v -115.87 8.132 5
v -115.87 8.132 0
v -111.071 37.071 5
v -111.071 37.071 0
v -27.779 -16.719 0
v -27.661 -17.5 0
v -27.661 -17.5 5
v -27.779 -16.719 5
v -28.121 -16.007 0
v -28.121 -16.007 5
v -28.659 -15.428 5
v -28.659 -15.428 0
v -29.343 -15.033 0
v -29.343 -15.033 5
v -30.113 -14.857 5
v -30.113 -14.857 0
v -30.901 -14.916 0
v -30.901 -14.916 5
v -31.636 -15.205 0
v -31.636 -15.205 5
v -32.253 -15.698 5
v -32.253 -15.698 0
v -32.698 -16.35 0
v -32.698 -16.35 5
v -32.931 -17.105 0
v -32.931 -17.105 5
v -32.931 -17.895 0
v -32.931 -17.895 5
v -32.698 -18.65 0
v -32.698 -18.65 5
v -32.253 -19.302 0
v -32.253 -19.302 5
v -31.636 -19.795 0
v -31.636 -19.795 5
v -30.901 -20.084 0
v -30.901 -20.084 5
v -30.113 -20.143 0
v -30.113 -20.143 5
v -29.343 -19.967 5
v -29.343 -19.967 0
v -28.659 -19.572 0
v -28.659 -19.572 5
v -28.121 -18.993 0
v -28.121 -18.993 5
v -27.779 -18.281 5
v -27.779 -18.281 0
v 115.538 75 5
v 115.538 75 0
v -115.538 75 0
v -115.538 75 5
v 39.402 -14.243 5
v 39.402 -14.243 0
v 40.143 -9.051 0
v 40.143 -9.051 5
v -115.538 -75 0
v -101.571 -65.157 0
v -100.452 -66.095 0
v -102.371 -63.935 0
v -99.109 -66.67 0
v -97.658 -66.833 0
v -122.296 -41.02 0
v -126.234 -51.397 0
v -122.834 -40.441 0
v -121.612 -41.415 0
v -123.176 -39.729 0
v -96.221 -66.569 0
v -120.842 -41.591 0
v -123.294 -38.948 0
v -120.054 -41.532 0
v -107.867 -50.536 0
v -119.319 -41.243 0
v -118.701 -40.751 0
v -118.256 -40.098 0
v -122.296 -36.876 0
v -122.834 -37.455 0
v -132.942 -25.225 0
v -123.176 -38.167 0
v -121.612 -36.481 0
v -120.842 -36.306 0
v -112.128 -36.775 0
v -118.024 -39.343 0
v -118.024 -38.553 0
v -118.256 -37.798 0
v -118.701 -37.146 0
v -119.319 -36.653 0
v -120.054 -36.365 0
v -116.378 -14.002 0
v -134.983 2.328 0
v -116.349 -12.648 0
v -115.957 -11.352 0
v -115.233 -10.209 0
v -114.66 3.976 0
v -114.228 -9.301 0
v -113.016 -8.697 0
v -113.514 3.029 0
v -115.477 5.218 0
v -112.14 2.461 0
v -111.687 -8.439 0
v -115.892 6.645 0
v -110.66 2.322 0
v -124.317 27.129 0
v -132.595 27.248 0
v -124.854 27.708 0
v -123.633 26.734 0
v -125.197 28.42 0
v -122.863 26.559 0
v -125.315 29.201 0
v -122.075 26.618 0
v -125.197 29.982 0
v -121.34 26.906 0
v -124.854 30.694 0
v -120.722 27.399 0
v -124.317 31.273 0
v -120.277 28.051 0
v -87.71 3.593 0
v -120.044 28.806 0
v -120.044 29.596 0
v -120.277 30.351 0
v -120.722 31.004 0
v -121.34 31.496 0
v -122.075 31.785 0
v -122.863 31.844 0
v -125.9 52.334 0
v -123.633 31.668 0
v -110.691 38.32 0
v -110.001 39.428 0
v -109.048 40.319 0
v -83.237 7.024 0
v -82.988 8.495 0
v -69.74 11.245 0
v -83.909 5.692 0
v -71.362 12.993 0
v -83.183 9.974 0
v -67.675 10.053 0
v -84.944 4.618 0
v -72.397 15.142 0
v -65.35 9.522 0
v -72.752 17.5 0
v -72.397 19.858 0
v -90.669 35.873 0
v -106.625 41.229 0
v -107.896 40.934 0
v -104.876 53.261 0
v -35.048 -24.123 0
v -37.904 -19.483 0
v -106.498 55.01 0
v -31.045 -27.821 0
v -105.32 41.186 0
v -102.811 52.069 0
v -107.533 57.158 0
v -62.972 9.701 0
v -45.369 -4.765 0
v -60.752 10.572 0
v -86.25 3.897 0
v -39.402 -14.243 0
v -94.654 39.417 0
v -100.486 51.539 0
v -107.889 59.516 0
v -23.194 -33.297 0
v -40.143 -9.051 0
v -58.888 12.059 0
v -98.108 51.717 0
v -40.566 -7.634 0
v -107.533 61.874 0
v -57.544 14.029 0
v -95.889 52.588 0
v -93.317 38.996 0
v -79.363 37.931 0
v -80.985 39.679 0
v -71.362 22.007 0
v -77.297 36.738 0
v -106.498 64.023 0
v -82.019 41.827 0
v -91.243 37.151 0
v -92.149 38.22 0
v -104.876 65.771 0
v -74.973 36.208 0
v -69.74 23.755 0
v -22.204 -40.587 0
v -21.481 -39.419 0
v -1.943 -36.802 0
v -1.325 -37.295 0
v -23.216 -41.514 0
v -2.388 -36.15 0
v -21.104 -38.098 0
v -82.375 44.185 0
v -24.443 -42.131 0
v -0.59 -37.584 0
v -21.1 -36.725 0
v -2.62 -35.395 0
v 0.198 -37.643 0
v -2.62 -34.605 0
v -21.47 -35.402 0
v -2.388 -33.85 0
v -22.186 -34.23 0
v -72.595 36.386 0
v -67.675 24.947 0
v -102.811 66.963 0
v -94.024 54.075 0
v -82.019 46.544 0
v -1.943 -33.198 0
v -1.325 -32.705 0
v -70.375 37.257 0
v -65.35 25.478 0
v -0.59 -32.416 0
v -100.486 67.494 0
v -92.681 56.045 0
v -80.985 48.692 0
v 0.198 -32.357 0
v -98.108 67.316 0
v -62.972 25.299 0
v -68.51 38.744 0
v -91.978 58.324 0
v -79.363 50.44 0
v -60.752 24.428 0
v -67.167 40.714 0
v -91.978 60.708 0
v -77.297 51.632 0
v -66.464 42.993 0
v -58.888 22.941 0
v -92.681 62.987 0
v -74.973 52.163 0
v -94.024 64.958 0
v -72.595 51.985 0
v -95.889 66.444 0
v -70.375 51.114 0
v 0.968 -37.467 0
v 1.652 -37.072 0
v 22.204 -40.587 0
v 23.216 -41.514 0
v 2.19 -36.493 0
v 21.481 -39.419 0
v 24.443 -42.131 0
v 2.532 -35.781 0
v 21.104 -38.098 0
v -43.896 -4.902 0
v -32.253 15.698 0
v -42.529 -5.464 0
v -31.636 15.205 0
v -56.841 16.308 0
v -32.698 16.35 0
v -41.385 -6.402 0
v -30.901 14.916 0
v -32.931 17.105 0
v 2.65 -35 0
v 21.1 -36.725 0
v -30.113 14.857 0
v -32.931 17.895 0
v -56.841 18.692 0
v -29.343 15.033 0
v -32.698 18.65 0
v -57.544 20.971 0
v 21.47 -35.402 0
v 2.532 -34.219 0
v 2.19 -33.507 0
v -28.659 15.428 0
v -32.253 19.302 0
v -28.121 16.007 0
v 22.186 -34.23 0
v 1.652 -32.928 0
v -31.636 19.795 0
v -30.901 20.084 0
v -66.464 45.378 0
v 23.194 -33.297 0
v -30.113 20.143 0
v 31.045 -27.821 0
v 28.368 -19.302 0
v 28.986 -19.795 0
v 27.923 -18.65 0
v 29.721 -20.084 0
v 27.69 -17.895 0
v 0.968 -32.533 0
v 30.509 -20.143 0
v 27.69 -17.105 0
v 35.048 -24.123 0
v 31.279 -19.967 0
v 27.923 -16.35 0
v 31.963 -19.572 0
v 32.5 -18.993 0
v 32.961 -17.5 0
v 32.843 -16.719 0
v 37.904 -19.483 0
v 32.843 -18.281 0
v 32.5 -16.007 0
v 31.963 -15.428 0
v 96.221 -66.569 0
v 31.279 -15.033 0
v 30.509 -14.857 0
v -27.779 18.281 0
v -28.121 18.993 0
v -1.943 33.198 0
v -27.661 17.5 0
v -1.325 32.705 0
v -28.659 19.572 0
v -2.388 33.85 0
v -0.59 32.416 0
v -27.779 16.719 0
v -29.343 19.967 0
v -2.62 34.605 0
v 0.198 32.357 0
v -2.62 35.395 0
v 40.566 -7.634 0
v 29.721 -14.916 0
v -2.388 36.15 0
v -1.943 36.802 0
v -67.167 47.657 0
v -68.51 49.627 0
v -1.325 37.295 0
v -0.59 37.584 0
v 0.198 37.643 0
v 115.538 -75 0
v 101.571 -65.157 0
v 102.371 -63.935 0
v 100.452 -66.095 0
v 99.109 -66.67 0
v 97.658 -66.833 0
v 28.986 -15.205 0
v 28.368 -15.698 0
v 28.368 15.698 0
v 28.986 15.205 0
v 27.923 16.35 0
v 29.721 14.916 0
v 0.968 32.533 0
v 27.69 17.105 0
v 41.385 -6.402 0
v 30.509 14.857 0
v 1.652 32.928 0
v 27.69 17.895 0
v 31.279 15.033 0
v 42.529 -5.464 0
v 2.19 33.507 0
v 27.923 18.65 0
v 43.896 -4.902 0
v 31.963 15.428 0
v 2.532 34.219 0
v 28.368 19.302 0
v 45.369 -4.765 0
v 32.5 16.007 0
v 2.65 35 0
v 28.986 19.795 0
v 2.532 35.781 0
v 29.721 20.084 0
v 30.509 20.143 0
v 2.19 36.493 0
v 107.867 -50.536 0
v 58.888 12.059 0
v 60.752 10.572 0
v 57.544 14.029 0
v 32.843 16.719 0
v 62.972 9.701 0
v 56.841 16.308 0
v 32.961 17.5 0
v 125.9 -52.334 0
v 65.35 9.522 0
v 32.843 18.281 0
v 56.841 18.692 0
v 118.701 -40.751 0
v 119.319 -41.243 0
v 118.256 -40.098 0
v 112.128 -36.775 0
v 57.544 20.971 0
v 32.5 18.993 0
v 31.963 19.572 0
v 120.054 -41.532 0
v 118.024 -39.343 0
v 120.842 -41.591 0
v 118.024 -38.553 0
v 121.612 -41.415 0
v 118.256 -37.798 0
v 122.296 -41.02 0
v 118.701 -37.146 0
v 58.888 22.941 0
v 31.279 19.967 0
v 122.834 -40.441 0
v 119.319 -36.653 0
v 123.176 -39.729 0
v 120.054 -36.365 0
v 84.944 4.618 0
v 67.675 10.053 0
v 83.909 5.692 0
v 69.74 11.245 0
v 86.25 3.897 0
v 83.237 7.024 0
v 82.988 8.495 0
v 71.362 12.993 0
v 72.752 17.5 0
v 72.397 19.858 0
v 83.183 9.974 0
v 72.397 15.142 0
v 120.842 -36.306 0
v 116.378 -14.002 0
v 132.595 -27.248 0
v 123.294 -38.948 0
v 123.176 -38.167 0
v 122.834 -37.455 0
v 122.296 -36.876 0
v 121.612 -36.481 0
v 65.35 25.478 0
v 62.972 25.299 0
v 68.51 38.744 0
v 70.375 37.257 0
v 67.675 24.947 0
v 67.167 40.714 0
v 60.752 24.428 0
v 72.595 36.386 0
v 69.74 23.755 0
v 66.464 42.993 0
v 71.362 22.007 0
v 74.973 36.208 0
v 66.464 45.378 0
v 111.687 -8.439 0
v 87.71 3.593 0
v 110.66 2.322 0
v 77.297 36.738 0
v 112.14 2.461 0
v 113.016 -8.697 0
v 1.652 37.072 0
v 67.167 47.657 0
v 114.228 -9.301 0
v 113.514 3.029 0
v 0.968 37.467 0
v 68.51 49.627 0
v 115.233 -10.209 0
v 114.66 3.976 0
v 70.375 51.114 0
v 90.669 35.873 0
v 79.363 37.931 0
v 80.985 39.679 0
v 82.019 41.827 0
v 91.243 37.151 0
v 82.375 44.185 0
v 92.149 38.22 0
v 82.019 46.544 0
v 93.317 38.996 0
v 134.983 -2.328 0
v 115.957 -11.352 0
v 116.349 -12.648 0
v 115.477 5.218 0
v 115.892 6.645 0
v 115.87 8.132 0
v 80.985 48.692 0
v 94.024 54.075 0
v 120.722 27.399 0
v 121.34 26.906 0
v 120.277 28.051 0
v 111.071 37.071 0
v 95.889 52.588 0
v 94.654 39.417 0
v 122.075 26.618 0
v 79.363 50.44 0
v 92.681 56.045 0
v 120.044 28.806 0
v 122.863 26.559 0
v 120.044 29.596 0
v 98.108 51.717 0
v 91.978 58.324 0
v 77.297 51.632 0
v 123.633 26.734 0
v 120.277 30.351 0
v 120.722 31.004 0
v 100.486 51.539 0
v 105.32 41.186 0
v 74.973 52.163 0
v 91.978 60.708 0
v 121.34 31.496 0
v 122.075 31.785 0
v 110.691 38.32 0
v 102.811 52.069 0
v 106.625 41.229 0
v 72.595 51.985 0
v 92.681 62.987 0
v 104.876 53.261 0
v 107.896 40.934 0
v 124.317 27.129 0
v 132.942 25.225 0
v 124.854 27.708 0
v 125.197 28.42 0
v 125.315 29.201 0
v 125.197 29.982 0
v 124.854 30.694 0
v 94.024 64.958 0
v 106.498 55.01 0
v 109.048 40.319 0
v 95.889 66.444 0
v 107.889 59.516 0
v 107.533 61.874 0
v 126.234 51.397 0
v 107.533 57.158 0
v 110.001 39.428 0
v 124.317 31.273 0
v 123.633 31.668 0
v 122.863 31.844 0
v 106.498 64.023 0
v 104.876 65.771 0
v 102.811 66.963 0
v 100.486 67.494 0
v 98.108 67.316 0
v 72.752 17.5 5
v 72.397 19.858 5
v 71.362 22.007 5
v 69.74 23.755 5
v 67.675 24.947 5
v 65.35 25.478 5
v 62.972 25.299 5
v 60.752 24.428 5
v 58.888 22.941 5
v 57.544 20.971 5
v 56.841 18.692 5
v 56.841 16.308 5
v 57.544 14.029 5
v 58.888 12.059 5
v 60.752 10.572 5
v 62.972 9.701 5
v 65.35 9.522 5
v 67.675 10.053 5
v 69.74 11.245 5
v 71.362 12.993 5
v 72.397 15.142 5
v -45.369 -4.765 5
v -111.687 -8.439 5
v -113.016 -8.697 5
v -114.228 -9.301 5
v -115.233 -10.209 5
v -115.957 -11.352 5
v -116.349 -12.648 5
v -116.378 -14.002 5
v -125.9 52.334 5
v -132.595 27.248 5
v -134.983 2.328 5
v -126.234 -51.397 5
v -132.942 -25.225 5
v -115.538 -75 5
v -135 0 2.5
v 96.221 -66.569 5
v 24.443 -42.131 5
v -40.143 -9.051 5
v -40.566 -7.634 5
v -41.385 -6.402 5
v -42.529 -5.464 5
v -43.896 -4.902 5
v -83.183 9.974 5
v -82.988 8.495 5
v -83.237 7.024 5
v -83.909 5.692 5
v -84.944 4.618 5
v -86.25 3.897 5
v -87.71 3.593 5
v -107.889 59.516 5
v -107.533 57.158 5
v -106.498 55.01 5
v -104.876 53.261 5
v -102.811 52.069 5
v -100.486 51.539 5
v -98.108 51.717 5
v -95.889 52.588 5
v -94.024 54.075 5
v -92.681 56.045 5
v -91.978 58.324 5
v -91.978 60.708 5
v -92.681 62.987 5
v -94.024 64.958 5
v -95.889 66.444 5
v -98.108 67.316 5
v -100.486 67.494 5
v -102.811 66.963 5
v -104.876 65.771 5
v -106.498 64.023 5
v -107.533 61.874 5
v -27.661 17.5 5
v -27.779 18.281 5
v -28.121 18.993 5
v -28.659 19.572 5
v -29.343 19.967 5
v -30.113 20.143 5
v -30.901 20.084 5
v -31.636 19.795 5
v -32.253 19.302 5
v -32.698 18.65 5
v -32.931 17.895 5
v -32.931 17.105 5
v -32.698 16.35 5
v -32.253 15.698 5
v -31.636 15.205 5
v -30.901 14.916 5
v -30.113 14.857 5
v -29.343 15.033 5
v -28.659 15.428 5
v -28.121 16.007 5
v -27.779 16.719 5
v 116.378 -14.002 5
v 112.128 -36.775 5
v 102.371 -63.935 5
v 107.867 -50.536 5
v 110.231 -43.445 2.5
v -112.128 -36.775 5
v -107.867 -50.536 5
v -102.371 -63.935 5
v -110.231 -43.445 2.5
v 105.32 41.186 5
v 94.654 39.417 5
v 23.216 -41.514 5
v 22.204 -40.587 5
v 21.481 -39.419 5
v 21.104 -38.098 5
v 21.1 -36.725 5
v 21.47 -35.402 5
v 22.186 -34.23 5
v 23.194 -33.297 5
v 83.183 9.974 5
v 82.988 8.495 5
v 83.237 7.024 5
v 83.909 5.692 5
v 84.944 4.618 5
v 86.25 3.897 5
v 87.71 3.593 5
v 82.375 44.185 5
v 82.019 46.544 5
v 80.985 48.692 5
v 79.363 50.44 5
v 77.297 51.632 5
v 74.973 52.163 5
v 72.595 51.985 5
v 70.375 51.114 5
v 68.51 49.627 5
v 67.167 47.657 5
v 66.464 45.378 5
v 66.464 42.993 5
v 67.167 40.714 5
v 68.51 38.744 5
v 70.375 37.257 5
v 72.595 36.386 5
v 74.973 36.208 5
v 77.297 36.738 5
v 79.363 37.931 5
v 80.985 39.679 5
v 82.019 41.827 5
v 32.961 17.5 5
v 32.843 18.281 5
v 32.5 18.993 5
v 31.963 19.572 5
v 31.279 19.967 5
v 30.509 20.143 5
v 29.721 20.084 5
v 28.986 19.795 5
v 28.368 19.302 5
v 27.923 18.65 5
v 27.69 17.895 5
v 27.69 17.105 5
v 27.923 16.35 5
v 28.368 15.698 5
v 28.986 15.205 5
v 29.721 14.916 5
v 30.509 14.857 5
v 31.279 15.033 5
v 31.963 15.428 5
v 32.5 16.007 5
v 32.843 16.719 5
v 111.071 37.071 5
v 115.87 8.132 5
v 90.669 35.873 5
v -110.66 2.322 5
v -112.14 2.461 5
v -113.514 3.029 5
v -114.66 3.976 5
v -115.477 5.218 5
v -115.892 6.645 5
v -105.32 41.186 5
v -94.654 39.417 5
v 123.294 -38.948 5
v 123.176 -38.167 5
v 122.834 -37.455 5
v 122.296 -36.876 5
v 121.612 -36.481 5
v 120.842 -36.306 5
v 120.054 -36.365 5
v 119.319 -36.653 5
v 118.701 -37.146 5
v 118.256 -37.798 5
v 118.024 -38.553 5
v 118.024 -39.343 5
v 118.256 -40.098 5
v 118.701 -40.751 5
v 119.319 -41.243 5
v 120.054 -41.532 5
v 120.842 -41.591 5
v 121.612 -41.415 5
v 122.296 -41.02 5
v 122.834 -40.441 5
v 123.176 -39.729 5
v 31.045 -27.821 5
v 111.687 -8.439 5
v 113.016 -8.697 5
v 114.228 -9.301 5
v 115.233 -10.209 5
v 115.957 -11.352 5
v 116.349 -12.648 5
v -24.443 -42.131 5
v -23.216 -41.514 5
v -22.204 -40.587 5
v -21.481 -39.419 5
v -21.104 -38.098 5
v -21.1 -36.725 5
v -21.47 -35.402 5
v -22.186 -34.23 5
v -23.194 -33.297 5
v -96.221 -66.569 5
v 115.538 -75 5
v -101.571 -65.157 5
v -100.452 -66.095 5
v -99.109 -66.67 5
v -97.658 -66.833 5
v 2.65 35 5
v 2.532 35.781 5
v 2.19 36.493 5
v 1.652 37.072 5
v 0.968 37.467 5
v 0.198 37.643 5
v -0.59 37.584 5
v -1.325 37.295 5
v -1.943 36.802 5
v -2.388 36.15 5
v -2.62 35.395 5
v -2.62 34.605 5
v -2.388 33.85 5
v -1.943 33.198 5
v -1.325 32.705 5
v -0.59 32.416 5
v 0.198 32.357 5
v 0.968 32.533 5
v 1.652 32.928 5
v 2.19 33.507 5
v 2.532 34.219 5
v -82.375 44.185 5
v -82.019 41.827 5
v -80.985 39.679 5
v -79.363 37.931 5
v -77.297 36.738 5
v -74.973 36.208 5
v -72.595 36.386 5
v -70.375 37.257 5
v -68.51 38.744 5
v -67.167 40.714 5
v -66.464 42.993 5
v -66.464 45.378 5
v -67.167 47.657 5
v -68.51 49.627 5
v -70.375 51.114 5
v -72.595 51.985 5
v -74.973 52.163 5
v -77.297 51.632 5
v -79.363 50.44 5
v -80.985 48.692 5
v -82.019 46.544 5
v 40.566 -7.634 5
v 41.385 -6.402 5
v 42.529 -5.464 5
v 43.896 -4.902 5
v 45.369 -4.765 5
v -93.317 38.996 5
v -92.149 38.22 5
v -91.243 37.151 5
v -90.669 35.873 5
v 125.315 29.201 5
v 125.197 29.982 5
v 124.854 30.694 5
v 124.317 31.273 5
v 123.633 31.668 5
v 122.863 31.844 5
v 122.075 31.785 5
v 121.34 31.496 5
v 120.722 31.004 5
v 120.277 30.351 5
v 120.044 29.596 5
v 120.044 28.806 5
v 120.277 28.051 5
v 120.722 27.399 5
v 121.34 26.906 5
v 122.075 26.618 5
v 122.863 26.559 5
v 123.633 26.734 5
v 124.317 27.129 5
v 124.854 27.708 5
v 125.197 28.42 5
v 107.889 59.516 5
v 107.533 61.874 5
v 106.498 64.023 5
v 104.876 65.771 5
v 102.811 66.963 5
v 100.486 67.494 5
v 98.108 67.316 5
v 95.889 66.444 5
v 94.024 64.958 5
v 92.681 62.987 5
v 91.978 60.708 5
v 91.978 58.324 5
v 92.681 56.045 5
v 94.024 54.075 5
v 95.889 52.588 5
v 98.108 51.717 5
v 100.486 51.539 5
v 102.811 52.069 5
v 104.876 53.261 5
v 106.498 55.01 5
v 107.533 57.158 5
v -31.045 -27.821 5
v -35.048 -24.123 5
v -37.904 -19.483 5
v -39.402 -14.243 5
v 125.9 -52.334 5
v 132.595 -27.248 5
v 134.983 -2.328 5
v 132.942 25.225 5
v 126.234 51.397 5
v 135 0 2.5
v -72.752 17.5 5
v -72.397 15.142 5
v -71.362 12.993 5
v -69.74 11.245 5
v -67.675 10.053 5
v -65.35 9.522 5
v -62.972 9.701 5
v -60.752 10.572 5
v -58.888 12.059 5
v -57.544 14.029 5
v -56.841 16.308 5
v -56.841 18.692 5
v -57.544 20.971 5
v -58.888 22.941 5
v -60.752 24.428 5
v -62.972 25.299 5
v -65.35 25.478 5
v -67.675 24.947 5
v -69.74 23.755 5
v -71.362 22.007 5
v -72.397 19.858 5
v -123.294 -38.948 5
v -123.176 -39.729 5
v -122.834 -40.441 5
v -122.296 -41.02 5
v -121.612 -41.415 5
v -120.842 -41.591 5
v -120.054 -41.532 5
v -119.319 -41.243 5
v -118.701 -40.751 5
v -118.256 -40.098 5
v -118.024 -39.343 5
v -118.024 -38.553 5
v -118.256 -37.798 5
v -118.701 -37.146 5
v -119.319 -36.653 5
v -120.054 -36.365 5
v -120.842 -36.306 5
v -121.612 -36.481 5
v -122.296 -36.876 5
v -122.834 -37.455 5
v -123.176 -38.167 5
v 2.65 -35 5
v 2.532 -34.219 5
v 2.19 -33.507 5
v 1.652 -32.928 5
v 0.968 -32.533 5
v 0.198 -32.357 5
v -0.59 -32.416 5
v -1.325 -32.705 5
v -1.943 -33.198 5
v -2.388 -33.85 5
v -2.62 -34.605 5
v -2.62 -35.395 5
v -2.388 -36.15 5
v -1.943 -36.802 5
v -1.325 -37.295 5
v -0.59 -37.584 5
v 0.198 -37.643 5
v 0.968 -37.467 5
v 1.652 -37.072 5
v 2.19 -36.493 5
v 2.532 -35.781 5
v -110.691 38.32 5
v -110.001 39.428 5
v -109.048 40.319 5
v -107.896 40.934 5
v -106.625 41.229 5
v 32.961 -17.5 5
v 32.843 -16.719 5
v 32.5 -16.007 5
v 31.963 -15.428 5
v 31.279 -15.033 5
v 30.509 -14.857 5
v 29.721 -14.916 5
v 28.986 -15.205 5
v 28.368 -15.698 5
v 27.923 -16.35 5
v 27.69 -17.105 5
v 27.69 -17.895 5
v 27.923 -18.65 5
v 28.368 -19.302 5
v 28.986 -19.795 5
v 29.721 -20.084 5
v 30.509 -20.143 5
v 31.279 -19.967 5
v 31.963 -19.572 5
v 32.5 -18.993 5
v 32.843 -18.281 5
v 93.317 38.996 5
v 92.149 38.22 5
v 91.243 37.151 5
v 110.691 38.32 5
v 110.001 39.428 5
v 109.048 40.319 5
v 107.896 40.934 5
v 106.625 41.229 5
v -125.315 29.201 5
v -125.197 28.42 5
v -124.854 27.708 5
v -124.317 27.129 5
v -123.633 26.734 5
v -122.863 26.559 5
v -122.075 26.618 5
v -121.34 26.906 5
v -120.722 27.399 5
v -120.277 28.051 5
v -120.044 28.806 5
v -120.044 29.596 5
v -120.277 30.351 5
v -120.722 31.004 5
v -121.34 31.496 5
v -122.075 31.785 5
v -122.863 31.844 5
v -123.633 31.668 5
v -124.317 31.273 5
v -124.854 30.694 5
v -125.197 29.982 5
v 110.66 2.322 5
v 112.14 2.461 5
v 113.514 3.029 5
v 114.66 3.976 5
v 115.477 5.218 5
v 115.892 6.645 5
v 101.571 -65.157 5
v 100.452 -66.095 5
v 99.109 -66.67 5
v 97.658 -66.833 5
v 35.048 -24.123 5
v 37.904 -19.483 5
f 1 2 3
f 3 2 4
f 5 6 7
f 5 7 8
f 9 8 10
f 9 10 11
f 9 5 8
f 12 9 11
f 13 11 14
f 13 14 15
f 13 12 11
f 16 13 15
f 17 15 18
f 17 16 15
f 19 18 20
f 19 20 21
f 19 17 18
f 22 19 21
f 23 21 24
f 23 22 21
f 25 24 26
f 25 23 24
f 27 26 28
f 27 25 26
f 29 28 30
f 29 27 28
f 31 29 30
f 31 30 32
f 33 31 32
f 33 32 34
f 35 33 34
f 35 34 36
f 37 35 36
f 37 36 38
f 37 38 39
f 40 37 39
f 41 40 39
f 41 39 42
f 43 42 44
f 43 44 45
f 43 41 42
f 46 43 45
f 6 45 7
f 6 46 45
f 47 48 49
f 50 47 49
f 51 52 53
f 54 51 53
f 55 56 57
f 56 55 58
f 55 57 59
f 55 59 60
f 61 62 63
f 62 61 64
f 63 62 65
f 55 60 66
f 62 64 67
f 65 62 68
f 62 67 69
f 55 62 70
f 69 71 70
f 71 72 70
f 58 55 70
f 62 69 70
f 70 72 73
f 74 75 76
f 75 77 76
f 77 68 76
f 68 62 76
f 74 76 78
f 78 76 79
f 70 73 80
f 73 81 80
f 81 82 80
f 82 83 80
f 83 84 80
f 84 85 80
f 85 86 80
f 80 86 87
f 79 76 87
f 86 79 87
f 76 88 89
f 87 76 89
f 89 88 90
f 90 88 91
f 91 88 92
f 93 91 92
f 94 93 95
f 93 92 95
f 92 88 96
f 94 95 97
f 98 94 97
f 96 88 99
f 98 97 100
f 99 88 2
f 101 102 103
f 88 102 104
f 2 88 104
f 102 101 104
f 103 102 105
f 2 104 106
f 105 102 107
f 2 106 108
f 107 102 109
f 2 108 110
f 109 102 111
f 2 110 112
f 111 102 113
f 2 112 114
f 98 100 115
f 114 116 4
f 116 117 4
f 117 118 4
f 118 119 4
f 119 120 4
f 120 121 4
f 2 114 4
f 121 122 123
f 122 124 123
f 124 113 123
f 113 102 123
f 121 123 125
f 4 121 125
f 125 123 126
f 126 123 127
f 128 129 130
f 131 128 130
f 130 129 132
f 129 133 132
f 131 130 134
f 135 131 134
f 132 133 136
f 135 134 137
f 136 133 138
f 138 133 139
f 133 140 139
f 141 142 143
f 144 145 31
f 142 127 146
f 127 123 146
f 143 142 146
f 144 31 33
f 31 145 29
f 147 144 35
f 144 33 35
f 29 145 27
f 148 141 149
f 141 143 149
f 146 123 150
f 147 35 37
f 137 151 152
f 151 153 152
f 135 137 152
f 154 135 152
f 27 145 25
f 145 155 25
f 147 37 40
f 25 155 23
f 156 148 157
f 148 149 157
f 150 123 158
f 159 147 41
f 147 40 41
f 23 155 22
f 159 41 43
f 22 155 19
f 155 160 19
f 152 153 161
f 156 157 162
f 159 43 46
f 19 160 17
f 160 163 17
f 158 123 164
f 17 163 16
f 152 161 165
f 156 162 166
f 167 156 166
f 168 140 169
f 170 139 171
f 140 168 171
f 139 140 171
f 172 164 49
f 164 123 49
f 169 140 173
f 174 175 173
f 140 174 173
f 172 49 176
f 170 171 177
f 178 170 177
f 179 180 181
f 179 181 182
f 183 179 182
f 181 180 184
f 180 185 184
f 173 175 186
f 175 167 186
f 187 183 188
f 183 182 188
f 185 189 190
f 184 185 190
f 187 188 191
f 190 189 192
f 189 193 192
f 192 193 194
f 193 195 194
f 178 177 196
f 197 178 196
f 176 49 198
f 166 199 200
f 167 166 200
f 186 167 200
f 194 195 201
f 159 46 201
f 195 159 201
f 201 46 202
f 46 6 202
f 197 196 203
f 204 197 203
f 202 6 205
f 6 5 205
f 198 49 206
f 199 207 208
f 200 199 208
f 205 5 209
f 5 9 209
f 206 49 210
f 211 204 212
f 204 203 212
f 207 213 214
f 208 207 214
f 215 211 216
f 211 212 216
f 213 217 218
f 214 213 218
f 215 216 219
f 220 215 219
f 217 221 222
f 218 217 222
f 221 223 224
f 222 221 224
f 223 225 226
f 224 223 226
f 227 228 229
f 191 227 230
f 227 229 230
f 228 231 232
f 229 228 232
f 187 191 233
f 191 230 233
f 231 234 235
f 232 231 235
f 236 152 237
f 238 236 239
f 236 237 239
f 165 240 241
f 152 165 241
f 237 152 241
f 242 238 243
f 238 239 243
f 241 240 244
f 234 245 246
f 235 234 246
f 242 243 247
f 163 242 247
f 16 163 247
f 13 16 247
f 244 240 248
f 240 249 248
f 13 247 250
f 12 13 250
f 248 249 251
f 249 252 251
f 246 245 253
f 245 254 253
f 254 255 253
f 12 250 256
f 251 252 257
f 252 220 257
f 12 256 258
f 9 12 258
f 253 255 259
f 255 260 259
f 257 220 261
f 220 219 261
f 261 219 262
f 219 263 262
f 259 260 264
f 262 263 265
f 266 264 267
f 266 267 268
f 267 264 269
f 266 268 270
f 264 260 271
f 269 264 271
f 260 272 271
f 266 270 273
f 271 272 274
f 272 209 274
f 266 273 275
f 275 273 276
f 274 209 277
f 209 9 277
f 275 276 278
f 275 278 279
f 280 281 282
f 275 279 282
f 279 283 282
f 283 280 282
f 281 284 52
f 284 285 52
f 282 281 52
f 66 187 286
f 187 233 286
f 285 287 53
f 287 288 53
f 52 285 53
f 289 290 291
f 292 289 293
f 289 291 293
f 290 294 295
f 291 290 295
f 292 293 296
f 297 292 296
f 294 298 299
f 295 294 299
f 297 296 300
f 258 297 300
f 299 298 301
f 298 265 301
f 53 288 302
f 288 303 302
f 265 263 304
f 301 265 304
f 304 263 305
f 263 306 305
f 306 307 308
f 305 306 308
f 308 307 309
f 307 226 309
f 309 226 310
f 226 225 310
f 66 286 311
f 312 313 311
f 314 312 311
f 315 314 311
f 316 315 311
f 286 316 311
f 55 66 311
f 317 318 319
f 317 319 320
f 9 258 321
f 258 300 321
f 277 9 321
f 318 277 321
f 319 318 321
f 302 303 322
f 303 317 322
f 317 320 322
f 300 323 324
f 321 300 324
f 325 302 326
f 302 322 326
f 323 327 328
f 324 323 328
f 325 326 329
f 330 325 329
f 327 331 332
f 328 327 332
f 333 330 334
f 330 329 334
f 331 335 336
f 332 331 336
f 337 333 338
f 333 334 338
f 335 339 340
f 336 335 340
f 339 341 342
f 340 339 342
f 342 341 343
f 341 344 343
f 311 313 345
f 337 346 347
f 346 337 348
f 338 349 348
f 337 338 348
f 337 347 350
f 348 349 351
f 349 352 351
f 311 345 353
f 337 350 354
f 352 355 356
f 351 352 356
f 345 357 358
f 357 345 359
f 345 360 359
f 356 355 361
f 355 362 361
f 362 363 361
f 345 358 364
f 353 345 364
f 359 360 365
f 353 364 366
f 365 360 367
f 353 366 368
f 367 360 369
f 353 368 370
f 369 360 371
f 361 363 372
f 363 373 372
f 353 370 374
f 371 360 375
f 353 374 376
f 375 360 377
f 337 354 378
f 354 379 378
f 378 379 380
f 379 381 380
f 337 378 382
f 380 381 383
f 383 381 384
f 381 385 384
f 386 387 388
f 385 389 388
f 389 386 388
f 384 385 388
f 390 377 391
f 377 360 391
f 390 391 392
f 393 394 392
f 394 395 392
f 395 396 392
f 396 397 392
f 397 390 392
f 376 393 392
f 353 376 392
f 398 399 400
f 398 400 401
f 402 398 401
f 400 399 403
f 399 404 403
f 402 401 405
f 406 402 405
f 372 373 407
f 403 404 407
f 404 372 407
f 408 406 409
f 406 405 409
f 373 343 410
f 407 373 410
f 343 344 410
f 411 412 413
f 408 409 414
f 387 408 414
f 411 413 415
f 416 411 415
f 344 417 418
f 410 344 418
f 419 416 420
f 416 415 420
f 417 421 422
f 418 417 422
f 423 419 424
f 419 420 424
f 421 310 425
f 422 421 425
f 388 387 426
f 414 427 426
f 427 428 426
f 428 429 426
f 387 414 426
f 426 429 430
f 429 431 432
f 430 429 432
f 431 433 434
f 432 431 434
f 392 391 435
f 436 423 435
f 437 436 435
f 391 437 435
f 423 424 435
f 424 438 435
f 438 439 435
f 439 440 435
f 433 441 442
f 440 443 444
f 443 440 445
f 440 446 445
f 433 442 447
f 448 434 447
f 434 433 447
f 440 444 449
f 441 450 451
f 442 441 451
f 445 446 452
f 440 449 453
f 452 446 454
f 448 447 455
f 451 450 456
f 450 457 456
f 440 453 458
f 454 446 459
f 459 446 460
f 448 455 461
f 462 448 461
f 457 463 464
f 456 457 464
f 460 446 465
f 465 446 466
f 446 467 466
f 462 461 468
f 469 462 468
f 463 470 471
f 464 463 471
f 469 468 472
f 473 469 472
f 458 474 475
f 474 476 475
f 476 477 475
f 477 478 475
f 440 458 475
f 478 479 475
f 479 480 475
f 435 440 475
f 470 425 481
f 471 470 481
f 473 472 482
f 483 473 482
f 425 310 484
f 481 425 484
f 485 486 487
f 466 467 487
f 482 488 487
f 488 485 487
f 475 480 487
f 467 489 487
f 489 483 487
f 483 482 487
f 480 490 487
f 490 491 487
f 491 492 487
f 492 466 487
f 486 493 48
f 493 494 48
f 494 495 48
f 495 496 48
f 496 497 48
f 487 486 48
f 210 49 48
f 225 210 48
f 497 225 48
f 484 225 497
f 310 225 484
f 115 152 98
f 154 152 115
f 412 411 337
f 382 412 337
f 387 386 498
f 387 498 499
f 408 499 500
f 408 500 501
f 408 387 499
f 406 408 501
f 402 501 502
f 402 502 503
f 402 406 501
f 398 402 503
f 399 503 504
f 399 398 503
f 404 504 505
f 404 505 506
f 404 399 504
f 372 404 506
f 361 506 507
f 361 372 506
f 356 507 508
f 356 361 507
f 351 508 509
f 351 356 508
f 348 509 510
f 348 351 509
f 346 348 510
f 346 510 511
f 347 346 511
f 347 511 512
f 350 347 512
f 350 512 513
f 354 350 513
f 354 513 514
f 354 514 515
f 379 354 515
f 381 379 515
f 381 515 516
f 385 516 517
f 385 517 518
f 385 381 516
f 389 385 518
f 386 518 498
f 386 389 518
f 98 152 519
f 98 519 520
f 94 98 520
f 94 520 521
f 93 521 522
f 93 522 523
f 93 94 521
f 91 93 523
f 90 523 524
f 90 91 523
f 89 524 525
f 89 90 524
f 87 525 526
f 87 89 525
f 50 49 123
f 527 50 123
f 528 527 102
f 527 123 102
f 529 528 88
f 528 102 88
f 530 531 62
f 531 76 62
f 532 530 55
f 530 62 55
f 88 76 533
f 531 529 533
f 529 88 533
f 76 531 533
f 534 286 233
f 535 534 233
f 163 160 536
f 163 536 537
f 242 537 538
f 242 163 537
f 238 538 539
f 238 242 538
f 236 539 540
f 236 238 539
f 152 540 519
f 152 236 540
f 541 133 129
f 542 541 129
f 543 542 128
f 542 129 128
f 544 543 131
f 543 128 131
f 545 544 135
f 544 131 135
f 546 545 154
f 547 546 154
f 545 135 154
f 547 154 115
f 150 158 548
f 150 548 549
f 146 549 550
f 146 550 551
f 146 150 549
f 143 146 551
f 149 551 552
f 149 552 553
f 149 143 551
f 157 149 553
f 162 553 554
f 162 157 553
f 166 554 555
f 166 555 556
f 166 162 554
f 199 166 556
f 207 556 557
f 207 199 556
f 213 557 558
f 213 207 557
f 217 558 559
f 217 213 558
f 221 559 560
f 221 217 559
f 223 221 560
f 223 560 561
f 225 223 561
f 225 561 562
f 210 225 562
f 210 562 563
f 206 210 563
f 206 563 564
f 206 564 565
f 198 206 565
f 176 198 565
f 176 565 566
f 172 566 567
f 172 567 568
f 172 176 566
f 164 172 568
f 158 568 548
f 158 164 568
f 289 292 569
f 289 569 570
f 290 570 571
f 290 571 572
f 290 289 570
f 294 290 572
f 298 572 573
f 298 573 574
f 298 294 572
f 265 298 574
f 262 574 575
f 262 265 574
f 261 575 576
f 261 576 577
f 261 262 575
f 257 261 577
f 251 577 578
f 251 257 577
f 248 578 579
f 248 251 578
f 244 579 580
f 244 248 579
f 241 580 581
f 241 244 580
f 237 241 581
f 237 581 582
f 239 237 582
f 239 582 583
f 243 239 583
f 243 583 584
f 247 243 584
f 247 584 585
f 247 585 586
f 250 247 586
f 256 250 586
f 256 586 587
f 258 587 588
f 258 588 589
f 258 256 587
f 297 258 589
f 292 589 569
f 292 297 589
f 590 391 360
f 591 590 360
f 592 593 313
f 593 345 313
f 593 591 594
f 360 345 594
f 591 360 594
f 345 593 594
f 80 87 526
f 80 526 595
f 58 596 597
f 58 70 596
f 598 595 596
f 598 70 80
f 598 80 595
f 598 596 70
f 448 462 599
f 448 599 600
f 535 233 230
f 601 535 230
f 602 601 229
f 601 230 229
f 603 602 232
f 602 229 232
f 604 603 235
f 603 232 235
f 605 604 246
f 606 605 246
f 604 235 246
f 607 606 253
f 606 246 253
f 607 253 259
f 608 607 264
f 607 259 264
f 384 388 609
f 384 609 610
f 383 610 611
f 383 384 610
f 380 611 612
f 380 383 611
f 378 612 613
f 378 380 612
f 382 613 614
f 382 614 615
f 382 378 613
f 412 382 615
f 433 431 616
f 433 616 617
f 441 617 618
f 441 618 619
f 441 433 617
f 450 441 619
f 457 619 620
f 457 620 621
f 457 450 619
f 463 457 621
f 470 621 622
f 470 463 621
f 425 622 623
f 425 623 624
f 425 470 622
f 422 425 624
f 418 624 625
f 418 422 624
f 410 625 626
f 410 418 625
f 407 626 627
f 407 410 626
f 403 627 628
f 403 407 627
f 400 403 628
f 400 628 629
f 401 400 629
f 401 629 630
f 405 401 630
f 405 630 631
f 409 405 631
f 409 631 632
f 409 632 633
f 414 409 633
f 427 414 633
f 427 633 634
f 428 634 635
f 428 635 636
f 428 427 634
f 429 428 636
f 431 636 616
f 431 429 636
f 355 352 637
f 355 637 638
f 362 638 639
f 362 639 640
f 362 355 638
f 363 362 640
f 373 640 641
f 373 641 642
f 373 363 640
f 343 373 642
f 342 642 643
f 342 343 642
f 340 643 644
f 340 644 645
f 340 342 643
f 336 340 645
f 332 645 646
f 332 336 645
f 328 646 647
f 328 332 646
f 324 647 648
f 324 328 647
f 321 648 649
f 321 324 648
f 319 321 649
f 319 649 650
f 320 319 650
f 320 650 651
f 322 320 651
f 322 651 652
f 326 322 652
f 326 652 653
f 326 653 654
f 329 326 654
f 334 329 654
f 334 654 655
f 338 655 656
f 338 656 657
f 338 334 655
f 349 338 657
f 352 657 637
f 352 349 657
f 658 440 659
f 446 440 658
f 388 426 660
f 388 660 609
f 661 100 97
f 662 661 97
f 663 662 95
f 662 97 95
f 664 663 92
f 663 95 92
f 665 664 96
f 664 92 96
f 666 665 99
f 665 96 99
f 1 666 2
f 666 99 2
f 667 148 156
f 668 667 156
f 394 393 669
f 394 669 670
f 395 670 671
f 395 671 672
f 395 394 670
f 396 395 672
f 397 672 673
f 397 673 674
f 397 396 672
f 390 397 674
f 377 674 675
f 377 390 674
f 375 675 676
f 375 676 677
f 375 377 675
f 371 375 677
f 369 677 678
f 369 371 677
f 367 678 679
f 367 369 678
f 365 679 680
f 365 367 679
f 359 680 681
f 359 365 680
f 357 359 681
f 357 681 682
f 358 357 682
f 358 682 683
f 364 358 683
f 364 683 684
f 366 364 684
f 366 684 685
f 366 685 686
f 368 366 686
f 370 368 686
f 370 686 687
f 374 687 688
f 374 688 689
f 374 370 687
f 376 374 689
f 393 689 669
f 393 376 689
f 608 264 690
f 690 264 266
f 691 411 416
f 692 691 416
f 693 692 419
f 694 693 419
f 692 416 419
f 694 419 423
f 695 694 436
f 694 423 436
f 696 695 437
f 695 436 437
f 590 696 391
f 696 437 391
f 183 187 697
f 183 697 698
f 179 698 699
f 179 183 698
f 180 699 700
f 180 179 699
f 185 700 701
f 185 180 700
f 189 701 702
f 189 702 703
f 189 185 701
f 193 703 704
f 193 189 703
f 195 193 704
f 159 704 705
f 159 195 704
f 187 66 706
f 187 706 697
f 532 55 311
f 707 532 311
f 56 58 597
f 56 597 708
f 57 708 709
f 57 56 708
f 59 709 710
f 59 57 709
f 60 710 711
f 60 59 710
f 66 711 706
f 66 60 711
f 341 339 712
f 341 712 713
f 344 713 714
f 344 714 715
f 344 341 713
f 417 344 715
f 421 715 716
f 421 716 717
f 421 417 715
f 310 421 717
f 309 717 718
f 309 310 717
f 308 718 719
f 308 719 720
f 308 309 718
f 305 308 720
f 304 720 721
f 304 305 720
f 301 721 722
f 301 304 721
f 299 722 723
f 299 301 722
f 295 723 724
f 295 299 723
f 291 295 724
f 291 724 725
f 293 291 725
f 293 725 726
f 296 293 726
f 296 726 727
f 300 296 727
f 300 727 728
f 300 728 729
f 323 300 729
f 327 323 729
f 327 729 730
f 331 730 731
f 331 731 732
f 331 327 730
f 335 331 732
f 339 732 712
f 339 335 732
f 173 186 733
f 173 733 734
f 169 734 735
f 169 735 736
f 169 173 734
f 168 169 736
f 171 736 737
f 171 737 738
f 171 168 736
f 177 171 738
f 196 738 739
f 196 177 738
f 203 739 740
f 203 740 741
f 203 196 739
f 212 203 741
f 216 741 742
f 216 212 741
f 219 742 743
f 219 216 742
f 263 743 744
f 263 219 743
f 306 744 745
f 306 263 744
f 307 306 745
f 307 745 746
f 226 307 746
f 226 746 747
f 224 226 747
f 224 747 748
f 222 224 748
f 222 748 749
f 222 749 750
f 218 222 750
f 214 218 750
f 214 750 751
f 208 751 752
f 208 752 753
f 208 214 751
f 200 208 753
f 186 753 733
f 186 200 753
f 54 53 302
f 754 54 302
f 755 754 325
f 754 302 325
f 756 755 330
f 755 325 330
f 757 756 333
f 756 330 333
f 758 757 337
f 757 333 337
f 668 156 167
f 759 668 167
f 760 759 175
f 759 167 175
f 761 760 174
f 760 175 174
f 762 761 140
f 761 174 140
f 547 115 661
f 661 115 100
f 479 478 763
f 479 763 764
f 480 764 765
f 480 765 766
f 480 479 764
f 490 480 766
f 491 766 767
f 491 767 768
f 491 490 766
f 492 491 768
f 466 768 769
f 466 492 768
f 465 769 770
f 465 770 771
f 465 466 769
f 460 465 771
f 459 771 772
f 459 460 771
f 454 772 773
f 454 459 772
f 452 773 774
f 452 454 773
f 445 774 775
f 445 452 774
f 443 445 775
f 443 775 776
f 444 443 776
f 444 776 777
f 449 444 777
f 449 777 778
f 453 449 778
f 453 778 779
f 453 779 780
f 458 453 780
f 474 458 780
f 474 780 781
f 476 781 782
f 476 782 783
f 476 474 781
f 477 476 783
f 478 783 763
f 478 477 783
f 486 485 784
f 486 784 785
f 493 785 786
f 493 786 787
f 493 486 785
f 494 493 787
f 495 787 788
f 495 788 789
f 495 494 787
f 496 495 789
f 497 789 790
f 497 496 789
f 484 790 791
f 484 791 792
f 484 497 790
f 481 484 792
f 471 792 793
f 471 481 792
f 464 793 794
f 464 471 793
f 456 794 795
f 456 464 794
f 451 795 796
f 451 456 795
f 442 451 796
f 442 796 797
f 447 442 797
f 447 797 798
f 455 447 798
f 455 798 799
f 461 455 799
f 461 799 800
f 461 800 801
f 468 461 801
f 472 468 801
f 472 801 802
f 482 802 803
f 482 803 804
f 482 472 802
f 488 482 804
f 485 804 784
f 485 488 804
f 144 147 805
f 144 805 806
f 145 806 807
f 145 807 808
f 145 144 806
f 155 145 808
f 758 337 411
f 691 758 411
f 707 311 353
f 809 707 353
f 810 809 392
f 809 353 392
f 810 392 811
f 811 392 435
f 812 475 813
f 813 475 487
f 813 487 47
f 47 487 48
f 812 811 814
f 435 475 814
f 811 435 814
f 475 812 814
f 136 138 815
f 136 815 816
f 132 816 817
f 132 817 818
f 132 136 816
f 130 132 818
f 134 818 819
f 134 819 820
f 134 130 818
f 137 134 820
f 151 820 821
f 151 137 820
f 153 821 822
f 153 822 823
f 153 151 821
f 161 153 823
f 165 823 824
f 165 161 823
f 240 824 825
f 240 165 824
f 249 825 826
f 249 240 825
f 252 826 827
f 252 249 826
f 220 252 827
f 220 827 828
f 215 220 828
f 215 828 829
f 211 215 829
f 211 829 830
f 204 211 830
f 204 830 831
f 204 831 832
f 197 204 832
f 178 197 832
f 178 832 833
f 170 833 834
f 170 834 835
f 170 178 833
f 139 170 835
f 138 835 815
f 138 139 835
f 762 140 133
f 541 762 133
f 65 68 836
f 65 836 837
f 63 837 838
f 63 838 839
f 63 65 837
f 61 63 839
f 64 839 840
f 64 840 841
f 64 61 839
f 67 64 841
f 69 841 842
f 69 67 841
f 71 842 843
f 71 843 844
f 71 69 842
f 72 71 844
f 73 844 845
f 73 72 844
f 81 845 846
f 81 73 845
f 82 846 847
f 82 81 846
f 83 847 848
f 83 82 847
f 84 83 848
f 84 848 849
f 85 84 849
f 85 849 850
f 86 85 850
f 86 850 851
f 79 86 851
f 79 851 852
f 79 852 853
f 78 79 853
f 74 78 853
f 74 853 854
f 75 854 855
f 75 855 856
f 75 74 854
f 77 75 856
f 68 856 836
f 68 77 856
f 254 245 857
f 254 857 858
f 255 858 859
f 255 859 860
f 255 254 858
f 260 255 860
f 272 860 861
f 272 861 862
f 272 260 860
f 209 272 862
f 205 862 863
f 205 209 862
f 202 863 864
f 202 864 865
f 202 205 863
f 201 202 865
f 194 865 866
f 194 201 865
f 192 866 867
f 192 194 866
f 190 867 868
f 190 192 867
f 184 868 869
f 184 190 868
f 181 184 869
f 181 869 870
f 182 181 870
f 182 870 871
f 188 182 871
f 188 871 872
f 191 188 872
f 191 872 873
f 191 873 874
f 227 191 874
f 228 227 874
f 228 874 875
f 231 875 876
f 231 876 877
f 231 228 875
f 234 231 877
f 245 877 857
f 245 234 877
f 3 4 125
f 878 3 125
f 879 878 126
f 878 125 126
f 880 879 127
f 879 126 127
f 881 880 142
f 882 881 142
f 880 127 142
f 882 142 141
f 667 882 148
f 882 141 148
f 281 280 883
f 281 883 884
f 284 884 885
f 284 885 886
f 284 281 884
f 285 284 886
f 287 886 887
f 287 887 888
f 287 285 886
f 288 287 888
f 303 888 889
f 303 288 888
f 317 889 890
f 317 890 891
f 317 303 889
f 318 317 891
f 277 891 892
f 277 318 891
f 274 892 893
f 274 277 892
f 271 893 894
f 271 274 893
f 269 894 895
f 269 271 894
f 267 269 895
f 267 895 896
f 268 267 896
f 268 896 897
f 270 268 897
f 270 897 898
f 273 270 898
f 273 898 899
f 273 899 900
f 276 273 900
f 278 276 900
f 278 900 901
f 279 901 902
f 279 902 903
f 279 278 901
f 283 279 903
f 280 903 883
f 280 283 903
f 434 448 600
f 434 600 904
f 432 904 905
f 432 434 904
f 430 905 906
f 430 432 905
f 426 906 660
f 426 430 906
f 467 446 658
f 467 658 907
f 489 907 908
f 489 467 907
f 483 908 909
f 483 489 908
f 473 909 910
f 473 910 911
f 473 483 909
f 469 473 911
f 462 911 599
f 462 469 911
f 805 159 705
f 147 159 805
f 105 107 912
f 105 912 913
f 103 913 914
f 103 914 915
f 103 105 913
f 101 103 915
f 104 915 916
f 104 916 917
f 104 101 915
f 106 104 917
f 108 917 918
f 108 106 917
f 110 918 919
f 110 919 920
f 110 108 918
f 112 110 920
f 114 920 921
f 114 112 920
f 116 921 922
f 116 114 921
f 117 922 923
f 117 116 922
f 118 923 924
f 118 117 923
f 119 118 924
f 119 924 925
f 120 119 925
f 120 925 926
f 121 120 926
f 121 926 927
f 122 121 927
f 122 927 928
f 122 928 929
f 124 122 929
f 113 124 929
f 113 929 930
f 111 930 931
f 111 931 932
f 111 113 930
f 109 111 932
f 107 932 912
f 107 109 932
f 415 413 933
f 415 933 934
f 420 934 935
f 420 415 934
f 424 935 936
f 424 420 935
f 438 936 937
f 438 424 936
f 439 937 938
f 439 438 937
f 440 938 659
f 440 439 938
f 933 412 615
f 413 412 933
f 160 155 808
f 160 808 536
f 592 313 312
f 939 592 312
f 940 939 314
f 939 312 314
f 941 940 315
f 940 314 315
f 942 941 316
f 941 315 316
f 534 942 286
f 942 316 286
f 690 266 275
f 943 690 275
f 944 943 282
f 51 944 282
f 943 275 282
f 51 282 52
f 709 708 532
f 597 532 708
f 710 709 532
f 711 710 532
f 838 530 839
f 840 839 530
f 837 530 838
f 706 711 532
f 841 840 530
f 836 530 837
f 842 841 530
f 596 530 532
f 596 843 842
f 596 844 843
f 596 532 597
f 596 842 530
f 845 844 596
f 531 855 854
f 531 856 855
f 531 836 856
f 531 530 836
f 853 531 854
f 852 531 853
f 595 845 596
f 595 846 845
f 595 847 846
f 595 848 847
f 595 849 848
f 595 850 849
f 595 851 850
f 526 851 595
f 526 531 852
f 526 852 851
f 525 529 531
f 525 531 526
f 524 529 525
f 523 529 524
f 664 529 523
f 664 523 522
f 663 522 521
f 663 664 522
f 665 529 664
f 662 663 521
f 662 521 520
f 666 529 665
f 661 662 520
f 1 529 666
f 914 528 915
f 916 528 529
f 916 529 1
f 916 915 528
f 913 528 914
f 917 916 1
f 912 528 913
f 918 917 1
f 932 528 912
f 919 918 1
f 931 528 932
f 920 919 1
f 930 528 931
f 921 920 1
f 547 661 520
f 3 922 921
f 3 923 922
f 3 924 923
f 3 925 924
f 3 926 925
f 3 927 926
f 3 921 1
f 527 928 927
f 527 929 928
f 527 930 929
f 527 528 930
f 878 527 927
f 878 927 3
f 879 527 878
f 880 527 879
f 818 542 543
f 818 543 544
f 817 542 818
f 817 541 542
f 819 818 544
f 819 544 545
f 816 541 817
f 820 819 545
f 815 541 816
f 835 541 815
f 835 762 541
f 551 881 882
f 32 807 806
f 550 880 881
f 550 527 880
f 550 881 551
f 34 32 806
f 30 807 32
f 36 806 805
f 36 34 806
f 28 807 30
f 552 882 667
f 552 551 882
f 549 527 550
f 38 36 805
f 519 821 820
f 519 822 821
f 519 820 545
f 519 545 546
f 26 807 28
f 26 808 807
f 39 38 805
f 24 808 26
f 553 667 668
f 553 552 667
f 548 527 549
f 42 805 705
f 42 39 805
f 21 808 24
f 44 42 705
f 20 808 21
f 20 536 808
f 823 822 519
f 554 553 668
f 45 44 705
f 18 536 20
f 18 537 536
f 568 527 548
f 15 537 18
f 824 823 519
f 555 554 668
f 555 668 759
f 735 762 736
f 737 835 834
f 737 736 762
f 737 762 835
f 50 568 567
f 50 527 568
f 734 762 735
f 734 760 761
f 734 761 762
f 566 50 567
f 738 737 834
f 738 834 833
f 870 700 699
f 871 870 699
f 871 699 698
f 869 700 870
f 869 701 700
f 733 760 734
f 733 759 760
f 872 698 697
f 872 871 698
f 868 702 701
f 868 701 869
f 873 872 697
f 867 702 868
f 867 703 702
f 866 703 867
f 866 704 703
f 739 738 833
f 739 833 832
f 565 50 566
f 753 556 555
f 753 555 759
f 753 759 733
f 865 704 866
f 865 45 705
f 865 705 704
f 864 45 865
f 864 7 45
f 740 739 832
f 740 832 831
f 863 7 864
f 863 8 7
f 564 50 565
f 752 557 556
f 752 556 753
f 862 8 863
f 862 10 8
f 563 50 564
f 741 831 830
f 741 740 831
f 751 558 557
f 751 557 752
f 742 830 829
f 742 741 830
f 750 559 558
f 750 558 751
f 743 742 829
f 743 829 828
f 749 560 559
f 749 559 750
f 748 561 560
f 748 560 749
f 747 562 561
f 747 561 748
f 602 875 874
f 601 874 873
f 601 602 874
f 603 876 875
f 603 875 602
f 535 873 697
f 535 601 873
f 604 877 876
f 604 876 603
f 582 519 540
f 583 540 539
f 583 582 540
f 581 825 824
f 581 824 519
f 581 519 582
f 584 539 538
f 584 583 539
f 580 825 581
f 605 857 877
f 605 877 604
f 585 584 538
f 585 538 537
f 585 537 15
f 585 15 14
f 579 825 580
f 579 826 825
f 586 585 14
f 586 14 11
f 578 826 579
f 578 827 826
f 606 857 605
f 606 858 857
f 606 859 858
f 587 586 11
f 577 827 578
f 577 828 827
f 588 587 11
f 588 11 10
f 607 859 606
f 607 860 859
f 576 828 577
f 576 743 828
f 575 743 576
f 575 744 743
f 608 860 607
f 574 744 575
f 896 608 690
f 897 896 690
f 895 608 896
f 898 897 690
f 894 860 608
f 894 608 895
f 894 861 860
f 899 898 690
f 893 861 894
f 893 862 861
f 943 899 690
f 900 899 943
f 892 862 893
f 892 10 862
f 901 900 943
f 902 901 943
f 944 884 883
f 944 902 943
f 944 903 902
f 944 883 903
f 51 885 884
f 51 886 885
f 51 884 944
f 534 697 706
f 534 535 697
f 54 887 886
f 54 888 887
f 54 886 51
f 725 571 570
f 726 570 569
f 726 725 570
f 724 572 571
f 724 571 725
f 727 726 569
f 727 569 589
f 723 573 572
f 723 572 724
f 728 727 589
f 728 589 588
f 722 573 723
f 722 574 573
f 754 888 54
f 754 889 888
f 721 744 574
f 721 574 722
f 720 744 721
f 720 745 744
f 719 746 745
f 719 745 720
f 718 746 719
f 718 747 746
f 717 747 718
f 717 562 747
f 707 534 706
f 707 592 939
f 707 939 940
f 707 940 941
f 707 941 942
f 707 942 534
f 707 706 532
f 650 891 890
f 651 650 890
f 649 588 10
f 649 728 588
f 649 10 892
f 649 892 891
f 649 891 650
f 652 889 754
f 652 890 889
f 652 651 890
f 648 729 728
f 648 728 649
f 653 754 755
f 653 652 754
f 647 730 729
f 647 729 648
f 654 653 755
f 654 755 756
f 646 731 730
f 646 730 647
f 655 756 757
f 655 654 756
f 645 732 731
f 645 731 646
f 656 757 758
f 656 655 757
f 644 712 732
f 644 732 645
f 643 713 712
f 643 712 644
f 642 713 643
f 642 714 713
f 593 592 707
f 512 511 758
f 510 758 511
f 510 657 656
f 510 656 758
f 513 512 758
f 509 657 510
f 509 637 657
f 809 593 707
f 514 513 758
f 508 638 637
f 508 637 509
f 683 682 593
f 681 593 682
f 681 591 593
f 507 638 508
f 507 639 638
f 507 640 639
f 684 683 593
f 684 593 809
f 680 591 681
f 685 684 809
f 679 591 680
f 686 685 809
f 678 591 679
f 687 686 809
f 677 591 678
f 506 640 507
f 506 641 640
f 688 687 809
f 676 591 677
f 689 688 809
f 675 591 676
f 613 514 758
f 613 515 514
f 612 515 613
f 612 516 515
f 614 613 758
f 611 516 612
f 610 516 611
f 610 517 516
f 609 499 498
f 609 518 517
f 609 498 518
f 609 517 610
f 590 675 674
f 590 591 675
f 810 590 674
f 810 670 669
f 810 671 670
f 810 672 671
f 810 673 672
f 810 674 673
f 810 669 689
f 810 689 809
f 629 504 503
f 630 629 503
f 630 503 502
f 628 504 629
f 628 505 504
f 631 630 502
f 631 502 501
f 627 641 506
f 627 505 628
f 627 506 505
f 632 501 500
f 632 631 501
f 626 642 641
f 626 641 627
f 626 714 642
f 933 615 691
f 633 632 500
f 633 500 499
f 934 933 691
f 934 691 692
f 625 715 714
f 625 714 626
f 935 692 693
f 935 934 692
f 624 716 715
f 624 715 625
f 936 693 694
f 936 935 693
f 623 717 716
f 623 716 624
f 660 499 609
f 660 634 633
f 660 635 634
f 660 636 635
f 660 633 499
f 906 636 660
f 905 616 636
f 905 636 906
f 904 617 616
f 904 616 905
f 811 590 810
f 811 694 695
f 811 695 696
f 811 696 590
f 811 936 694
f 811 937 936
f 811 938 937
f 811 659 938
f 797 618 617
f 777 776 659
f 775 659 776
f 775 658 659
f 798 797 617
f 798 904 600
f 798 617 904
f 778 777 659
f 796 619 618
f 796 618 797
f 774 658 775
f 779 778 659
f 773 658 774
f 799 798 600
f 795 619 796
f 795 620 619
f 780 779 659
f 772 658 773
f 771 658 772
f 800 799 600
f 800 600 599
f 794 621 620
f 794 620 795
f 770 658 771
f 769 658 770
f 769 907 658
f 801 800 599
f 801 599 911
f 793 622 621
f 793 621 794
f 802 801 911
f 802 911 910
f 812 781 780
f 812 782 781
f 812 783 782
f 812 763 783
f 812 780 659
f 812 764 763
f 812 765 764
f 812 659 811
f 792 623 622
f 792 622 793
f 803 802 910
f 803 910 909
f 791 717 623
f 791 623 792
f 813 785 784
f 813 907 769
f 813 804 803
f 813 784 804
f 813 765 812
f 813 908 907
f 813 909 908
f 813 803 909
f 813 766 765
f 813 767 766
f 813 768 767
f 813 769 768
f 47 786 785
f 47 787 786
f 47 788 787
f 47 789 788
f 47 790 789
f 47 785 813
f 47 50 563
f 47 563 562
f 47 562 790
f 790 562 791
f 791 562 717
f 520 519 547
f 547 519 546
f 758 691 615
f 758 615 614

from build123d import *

# Parameters (mm, degrees)
SKETCH4_R           = 2.65
SKETCH4_R_2         = 8
BOSS_EXTRUDE1_DEPTH = 5


with BuildPart() as part:
    # Sketch4 → Boss-Extrude1 (new body)
    with BuildSketch(Plane.XY):
        with BuildLine():
            Line((-115.538340842, -75), (115.538340842, -75))
            add(Edge.make_bspline(
                [(115.538340842, -75), (157.739845208, 0), (115.538340842, 75)],
                knots=[1.027171819, 1.027171819, 1.027171819, 2.114420834, 2.114420834, 2.114420834], degree=2, weights=[1, 0.855839562, 1]))
            Line((115.538340842, 75), (-115.538340842, 75))
            add(Edge.make_bspline(
                [(-115.538340842, 75), (-157.739845208, 0), (-115.538340842, -75)],
                knots=[4.168764473, 4.168764473, 4.168764473, 5.256013488, 5.256013488, 5.256013488], degree=2, weights=[1, 0.855839562, 1]))
        make_face()
        with Locations((0, 35)):
            Circle(SKETCH4_R, mode=Mode.SUBTRACT)
        with Locations((30.310889132, 17.5)):
            Circle(SKETCH4_R, mode=Mode.SUBTRACT)
        with Locations((30.310889132, -17.5)):
            Circle(SKETCH4_R, mode=Mode.SUBTRACT)
        with Locations((0, -35)):
            Circle(SKETCH4_R, mode=Mode.SUBTRACT)
        with Locations((-30.310889132, -17.5)):
            Circle(SKETCH4_R, mode=Mode.SUBTRACT)
        with Locations((-30.310889132, 17.5)):
            Circle(SKETCH4_R, mode=Mode.SUBTRACT)
        with Locations((64.752033934, 17.5)):
            Circle(SKETCH4_R_2, mode=Mode.SUBTRACT)
        with Locations((74.374721355, 44.185460771)):
            Circle(SKETCH4_R_2, mode=Mode.SUBTRACT)
        with Locations((99.888536583, 59.516130447)):
            Circle(SKETCH4_R_2, mode=Mode.SUBTRACT)
        with Locations(Location((-99.888536583, 59.516130447, 0), (0, 0, 180))):
            Circle(SKETCH4_R_2, mode=Mode.SUBTRACT)
        with Locations(Location((-74.374721355, 44.185460771, 0), (0, 0, 180))):
            Circle(SKETCH4_R_2, mode=Mode.SUBTRACT)
        with Locations(Location((-64.752033934, 17.5, 0), (0, 0, 180))):
            Circle(SKETCH4_R_2, mode=Mode.SUBTRACT)
        with Locations((120.644049354, -38.948255584)):
            Circle(SKETCH4_R, mode=Mode.SUBTRACT)
        with Locations((122.664887702, 29.201114123)):
            Circle(SKETCH4_R, mode=Mode.SUBTRACT)
        with Locations(Location((-122.664887702, 29.201114123, 0), (0, 0, 180))):
            Circle(SKETCH4_R, mode=Mode.SUBTRACT)
        with Locations(Location((-120.644049354, -38.948255584, 0), (0, 0, 180))):
            Circle(SKETCH4_R, mode=Mode.SUBTRACT)
        with BuildLine():
            Line((96.221427668, -66.569190125), (24.443369148, -42.131459749))
            ThreePointArc((24.443369148, -42.131459749), (21.104097738, -38.098339283), (23.194170579, -33.297465429))
            Line((23.194170579, -33.297465429), (31.044827796, -27.820928801))
            ThreePointArc((31.044827796, -27.820928801), (36.634624949, -21.900779304), (39.401541781, -14.243222677))
            Line((39.401541781, -14.243222677), (40.142546192, -9.050682376))
            ThreePointArc((40.142546192, -9.050682376), (41.921887066, -5.890808111), (45.369026009, -4.764712013))
            Line((45.369026009, -4.764712013), (111.686928814, -8.439409623))
            ThreePointArc((111.686928814, -8.439409623), (115.232710002, -10.208524402), (116.377662166, -14.002126368))
            add(Edge.make_bspline(
                [(116.377662166, -14.002126368), (115.220834159, -24.076872303), (111.675987444, -41.055400313), (105.466013317, -57.243285168), (102.371009367, -63.934943838)],
                knots=[0.084665499, 0.084665499, 0.084665499, 0.084665499, 0.572063361, 0.927683596, 0.927683596, 0.927683596, 0.927683596], degree=3))
            ThreePointArc((102.371009367, -63.934943838), (99.801685805, -66.432067651), (96.221427668, -66.569190125))
        make_face(mode=Mode.SUBTRACT)
        with BuildLine():
            Line((115.869646859, 8.131830129), (111.070686254, 37.070959775))
            ThreePointArc((111.070686254, 37.070959775), (109.047553267, 40.319281474), (105.320071912, 41.18562072))
            Line((105.320071912, 41.18562072), (94.654082301, 39.416885289))
            ThreePointArc((94.654082301, 39.416885289), (92.149315195, 38.220472158), (90.668652636, 35.872515381))
            Line((90.668652636, 35.872515381), (83.183473525, 9.973795657))
            ThreePointArc((83.183473525, 9.973795657), (83.908923245, 5.692386099), (87.710252524, 3.593186057))
            Line((87.710252524, 3.593186057), (110.66038185, 2.321511565))
            ThreePointArc((110.66038185, 2.321511565), (114.659851997, 3.97612342), (115.869646859, 8.131830129))
        make_face(mode=Mode.SUBTRACT)
        with BuildLine():
            Line((-96.221427668, -66.569190125), (-24.443369148, -42.131459749))
            ThreePointArc((-24.443369148, -42.131459749), (-21.104097738, -38.098339283), (-23.194170579, -33.297465429))
            Line((-23.194170579, -33.297465429), (-31.044827796, -27.820928801))
            ThreePointArc((-31.044827796, -27.820928801), (-36.634624949, -21.900779304), (-39.401541781, -14.243222677))
            Line((-39.401541781, -14.243222677), (-40.142546192, -9.050682376))
            ThreePointArc((-40.142546192, -9.050682376), (-41.921887066, -5.890808111), (-45.369026009, -4.764712013))
            Line((-45.369026009, -4.764712013), (-111.686928814, -8.439409623))
            ThreePointArc((-111.686928814, -8.439409623), (-115.232710002, -10.208524402), (-116.377662166, -14.002126368))
            add(Edge.make_bspline(
                [(-116.377662166, -14.002126368), (-115.220834159, -24.076872303), (-111.675987444, -41.055400313), (-105.466013317, -57.243285168), (-102.371009367, -63.934943838)],
                knots=[0.084665499, 0.084665499, 0.084665499, 0.084665499, 0.572063361, 0.927683596, 0.927683596, 0.927683596, 0.927683596], degree=3))
            ThreePointArc((-102.371009367, -63.934943838), (-99.801685805, -66.432067651), (-96.221427668, -66.569190125))
        make_face(mode=Mode.SUBTRACT)
        with BuildLine():
            Line((-90.668652636, 35.872515381), (-83.183473525, 9.973795657))
            ThreePointArc((-83.183473525, 9.973795657), (-83.908923245, 5.692386099), (-87.710252524, 3.593186057))
            Line((-87.710252524, 3.593186057), (-110.66038185, 2.321511565))
            ThreePointArc((-110.66038185, 2.321511565), (-114.659851997, 3.97612342), (-115.869646859, 8.131830129))
            Line((-115.869646859, 8.131830129), (-111.070686254, 37.070959775))
            ThreePointArc((-111.070686254, 37.070959775), (-109.047553267, 40.319281474), (-105.320071912, 41.18562072))
            Line((-105.320071912, 41.18562072), (-94.654082301, 39.416885289))
            ThreePointArc((-94.654082301, 39.416885289), (-92.149315195, 38.220472158), (-90.668652636, 35.872515381))
        make_face(mode=Mode.SUBTRACT)
    extrude(amount=BOSS_EXTRUDE1_DEPTH)


solid = part.part
